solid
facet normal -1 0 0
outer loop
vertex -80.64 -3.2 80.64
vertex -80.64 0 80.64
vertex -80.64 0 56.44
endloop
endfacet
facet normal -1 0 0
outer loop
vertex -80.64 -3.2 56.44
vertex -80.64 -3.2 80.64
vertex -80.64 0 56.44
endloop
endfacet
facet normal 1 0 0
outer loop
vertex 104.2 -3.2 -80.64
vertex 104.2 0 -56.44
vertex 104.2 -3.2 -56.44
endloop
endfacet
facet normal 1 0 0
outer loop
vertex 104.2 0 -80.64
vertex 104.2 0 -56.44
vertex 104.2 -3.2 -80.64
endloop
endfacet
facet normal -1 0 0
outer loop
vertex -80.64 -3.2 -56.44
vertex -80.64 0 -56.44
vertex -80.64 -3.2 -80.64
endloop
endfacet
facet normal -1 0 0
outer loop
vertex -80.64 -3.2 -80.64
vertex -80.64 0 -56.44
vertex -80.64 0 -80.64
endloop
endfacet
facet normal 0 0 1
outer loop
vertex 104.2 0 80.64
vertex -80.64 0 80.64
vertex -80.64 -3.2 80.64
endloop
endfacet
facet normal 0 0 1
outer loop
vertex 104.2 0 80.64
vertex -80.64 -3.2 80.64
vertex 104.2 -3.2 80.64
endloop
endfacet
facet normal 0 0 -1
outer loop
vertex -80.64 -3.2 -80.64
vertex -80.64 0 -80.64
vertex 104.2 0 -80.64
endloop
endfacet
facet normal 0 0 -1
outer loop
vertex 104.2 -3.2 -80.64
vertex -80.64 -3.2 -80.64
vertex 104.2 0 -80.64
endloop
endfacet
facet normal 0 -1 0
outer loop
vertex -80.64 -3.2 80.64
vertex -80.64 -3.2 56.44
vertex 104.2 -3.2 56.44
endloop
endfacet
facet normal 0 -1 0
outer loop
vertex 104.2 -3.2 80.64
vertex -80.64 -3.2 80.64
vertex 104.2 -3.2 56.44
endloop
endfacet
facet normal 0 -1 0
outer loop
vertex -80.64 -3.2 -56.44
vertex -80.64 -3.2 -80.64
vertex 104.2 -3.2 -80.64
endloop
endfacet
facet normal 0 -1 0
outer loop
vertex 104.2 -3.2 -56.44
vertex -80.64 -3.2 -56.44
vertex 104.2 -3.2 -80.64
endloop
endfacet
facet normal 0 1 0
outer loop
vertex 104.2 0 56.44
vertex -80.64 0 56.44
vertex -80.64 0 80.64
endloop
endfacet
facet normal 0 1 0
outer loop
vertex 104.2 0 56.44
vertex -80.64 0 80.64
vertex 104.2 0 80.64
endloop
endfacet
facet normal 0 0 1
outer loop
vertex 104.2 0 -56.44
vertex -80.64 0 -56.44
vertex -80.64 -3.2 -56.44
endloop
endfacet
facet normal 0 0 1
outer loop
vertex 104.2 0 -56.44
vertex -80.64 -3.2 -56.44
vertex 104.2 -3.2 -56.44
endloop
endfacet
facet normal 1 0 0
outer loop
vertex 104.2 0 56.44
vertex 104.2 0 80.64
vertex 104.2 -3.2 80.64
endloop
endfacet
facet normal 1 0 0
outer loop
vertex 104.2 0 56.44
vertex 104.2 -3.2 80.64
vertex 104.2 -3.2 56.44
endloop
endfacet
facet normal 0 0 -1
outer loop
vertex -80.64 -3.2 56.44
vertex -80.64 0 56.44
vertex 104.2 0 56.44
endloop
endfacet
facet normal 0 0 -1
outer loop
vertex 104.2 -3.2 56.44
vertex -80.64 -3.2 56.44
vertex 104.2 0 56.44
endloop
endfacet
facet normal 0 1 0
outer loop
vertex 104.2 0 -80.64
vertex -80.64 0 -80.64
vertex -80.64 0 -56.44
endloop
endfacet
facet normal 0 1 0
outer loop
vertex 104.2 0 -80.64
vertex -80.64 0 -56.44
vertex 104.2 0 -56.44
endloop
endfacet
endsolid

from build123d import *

# Parameters (mm, degrees)
SKETCH1_W             = 184.839561026
SKETCH1_H             = 24.2
BOSS_EXTRUDE1_DEPTH   = 3.2
BOSS_EXTRUDE1_2_DEPTH = 3.2


with BuildPart() as part:
    # Sketch1 → Boss-Extrude1 (new body)
    with BuildSketch(Plane(origin=(0, 0, 0), x_dir=(1, 0, 0), z_dir=(0, 1, 0))):
        with Locations((11.780219487, 68.539561026)):
            Rectangle(SKETCH1_W, SKETCH1_H)
    extrude(amount=-BOSS_EXTRUDE1_DEPTH)


with BuildPart() as body_2:
    # Sketch1 → Boss-Extrude1 2 (new body)
    with BuildSketch(Plane(origin=(0, 0, 0), x_dir=(1, 0, 0), z_dir=(0, 1, 0))):
        with Locations((11.780219487, -68.539561026)):
            Rectangle(SKETCH1_W, SKETCH1_H)
    extrude(amount=-BOSS_EXTRUDE1_2_DEPTH)


solid = Compound([part.part, body_2.part])
